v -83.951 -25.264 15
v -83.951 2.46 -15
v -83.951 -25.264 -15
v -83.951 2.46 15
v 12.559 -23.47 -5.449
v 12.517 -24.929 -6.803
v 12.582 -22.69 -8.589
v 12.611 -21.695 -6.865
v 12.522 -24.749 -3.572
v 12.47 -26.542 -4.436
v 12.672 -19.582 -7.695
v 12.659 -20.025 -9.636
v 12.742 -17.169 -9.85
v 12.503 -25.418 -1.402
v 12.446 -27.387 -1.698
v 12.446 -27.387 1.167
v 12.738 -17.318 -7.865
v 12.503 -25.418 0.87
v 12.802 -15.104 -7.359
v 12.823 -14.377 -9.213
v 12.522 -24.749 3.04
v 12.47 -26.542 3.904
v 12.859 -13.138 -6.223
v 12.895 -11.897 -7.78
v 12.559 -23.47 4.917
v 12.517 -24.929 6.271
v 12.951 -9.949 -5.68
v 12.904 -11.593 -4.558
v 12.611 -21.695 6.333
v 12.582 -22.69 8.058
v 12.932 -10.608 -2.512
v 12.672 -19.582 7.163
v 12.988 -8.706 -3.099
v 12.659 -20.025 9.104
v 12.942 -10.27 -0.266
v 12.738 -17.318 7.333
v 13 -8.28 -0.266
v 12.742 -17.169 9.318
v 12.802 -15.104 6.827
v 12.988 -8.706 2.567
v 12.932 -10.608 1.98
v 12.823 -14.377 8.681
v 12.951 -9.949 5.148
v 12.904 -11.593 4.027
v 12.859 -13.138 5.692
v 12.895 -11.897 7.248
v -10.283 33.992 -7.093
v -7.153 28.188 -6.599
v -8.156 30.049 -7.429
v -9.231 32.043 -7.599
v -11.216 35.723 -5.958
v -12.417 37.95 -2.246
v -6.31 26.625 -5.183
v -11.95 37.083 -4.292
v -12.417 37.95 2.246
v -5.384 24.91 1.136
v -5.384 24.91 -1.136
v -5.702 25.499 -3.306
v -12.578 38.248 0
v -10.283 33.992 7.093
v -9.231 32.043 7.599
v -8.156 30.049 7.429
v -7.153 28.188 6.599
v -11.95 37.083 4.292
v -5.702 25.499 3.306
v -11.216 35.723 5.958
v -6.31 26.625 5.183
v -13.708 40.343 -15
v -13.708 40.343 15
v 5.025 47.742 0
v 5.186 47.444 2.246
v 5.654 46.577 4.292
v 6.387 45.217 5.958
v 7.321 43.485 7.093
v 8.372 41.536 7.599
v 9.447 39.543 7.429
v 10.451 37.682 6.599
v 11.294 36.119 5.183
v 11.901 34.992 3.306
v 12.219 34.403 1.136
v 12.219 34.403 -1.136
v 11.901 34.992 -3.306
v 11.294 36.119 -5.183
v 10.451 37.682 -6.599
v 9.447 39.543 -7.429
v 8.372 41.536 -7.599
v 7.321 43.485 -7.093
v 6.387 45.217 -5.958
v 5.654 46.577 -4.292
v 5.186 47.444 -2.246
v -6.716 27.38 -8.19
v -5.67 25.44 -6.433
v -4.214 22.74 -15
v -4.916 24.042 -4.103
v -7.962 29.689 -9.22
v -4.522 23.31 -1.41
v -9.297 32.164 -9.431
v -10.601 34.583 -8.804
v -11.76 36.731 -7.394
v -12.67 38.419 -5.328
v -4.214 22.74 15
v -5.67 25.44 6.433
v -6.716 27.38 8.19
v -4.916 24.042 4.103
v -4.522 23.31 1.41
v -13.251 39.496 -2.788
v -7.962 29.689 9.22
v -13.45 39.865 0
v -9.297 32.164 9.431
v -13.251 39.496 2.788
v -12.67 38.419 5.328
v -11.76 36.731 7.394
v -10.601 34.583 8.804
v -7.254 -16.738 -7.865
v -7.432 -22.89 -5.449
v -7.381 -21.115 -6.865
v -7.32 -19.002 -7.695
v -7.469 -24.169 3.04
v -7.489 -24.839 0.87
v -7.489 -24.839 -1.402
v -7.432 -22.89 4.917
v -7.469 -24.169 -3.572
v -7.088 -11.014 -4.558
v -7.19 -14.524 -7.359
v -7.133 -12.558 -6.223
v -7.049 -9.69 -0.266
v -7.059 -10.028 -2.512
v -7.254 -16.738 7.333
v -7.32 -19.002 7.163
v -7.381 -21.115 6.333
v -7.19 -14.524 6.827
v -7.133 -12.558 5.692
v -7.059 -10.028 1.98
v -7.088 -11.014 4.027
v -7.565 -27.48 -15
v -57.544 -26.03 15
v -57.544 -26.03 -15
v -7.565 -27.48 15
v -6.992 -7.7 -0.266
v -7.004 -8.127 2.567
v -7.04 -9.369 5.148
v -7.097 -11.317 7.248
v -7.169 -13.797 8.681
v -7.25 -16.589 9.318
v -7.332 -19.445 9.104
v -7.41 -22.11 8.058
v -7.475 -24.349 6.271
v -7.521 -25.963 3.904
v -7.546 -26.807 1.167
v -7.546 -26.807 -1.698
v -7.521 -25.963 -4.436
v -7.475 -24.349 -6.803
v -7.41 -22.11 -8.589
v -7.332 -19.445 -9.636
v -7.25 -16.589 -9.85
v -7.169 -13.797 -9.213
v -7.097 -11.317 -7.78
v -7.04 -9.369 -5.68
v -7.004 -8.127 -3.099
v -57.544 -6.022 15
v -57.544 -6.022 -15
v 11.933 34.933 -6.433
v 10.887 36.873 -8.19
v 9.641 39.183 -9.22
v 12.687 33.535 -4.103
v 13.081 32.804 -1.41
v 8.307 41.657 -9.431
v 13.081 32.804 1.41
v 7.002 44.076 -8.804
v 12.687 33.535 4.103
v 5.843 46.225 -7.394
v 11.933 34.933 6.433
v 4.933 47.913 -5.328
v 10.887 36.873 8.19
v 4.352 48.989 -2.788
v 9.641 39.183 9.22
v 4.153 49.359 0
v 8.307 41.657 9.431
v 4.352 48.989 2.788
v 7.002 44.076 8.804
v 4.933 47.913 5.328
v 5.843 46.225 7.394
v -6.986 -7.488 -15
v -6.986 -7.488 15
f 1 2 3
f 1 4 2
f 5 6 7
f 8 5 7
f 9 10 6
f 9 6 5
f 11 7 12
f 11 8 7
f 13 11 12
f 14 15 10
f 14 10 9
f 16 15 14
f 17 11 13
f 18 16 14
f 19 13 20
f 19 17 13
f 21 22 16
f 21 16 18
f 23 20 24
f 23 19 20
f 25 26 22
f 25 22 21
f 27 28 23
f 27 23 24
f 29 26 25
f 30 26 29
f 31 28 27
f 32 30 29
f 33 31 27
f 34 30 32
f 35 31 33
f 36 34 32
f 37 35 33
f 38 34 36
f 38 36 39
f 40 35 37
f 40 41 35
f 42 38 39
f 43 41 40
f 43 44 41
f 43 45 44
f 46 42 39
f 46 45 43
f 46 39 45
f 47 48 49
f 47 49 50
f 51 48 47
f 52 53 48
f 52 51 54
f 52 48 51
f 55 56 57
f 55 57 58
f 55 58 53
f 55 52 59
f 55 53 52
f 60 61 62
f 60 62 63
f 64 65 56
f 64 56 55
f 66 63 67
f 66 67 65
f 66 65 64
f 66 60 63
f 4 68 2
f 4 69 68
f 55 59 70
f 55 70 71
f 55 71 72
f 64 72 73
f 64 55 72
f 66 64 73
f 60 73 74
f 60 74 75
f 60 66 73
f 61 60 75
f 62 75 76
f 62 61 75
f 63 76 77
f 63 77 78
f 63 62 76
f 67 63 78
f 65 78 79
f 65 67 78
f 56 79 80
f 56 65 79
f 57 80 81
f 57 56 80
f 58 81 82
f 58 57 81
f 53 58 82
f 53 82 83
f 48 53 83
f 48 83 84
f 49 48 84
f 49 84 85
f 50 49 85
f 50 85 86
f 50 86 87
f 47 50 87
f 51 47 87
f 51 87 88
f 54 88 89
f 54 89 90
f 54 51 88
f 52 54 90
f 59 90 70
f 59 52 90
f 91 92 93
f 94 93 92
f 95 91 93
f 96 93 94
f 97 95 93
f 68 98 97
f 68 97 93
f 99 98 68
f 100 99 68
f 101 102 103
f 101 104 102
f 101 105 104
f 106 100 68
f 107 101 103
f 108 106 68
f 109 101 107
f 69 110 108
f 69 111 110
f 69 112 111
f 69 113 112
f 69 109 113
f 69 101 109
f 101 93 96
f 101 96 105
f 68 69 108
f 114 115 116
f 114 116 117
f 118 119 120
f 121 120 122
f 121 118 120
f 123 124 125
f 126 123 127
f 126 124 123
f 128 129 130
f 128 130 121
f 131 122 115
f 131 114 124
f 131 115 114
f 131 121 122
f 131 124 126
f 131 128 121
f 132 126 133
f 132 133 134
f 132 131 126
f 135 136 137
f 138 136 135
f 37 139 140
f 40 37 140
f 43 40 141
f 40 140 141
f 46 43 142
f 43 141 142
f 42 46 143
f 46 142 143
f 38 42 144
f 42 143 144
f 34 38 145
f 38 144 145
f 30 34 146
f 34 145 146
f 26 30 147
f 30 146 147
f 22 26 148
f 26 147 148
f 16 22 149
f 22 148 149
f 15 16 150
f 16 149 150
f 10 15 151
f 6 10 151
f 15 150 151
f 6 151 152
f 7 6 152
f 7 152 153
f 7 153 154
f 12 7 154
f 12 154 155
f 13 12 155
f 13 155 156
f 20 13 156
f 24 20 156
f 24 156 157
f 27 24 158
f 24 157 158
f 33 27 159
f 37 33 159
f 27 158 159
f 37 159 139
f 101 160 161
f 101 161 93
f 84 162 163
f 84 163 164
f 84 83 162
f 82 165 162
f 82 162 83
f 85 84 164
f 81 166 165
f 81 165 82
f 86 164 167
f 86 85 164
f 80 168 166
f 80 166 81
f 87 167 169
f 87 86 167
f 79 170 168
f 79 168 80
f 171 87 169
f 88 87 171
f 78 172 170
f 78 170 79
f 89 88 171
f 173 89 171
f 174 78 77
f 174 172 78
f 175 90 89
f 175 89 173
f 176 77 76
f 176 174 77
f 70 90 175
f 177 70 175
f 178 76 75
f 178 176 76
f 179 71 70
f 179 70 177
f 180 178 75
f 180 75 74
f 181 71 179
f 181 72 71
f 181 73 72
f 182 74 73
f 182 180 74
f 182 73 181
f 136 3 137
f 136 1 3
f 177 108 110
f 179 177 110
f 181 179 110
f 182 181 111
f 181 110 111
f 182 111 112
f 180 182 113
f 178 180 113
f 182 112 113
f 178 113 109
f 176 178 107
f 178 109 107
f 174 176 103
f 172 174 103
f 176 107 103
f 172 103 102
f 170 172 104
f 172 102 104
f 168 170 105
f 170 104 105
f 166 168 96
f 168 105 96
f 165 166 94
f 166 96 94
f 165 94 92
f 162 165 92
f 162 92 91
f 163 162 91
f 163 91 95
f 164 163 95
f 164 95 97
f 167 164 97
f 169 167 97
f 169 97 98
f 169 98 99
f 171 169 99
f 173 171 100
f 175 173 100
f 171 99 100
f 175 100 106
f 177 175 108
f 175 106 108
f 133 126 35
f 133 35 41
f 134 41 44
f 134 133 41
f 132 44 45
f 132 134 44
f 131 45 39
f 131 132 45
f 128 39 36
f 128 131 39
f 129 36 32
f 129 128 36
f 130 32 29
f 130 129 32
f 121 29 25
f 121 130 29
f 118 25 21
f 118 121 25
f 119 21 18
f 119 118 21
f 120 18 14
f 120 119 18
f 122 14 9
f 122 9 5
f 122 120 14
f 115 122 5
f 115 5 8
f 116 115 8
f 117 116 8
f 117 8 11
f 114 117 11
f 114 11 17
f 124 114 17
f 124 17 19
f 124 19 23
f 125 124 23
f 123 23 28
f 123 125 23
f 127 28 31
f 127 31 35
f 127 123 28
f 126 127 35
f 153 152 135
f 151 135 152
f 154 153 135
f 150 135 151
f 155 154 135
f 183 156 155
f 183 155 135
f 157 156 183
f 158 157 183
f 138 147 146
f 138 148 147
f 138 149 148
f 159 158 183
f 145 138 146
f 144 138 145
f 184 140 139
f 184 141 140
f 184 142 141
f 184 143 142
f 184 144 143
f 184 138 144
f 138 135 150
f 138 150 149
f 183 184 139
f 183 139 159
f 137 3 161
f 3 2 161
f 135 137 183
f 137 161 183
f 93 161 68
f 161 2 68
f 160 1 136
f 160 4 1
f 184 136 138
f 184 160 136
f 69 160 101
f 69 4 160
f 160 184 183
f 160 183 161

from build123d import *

# Parameters (mm, degrees)
F1_DEPTH = 15
F2_DEPTH = 15
F3_R     = 9.4573598756
F3_R_2   = 7.62
F4_DEPTH = 20
F5_R     = 9.6111895613
F5_R_2   = 7.62
F6_DEPTH = 20


with BuildPart() as f1:
    # F0 (on Top) → F1 (new body)
    with BuildSketch(Plane.XY):
        Polygon((-83.9506240486, -25.2640620153), (-57.5444474816, -26.0300338268), (-7.5654697983, -27.4797888861), (-6.9855677746, -7.4881978128), (-57.5444474816, -6.0216213632), (-4.2142863446, 22.7399175335), (-13.707871997, 40.3430942769), (-83.9506240486, 2.4604102147), align=None)
    extrude(amount=F1_DEPTH)

    # F2 (add): a face of the model
    f2_faces = [f1.faces().sort_by_distance(p)[0] for p in [
        (-48.3323554586, 20.4804051436, 0),
    ]]
    extrude(f2_faces, amount=F2_DEPTH)

    # F3 (on face) → F4 (join)
    with BuildSketch(Plane(origin=(6.235860558, 3.3630677682, 0), x_dir=(-0.4746792826, 0.8801588372, 0), z_dir=(0.8801588372, 0.4746792826, 0))):
        with Locations((32.0151737925, 0)):
            Circle(F3_R)
        with Locations((32.0151737925, 0)):
            Circle(F3_R_2, mode=Mode.SUBTRACT)
    extrude(amount=F4_DEPTH)

    # F5 (on face) → F6 (join)
    with BuildSketch(Plane(origin=(-6.7626651312, 0.1961666373, 0), x_dir=(0.0289951012, 0.9995795537, 0), z_dir=(0.9995795537, -0.0289951012, 0))):
        with Locations((-17.5103756727, -0.2658314989)):
            Circle(F5_R)
        with Locations((-17.5103756727, -0.2658314989)):
            Circle(F5_R_2, mode=Mode.SUBTRACT)
    extrude(amount=F6_DEPTH)


solid = f1.part
